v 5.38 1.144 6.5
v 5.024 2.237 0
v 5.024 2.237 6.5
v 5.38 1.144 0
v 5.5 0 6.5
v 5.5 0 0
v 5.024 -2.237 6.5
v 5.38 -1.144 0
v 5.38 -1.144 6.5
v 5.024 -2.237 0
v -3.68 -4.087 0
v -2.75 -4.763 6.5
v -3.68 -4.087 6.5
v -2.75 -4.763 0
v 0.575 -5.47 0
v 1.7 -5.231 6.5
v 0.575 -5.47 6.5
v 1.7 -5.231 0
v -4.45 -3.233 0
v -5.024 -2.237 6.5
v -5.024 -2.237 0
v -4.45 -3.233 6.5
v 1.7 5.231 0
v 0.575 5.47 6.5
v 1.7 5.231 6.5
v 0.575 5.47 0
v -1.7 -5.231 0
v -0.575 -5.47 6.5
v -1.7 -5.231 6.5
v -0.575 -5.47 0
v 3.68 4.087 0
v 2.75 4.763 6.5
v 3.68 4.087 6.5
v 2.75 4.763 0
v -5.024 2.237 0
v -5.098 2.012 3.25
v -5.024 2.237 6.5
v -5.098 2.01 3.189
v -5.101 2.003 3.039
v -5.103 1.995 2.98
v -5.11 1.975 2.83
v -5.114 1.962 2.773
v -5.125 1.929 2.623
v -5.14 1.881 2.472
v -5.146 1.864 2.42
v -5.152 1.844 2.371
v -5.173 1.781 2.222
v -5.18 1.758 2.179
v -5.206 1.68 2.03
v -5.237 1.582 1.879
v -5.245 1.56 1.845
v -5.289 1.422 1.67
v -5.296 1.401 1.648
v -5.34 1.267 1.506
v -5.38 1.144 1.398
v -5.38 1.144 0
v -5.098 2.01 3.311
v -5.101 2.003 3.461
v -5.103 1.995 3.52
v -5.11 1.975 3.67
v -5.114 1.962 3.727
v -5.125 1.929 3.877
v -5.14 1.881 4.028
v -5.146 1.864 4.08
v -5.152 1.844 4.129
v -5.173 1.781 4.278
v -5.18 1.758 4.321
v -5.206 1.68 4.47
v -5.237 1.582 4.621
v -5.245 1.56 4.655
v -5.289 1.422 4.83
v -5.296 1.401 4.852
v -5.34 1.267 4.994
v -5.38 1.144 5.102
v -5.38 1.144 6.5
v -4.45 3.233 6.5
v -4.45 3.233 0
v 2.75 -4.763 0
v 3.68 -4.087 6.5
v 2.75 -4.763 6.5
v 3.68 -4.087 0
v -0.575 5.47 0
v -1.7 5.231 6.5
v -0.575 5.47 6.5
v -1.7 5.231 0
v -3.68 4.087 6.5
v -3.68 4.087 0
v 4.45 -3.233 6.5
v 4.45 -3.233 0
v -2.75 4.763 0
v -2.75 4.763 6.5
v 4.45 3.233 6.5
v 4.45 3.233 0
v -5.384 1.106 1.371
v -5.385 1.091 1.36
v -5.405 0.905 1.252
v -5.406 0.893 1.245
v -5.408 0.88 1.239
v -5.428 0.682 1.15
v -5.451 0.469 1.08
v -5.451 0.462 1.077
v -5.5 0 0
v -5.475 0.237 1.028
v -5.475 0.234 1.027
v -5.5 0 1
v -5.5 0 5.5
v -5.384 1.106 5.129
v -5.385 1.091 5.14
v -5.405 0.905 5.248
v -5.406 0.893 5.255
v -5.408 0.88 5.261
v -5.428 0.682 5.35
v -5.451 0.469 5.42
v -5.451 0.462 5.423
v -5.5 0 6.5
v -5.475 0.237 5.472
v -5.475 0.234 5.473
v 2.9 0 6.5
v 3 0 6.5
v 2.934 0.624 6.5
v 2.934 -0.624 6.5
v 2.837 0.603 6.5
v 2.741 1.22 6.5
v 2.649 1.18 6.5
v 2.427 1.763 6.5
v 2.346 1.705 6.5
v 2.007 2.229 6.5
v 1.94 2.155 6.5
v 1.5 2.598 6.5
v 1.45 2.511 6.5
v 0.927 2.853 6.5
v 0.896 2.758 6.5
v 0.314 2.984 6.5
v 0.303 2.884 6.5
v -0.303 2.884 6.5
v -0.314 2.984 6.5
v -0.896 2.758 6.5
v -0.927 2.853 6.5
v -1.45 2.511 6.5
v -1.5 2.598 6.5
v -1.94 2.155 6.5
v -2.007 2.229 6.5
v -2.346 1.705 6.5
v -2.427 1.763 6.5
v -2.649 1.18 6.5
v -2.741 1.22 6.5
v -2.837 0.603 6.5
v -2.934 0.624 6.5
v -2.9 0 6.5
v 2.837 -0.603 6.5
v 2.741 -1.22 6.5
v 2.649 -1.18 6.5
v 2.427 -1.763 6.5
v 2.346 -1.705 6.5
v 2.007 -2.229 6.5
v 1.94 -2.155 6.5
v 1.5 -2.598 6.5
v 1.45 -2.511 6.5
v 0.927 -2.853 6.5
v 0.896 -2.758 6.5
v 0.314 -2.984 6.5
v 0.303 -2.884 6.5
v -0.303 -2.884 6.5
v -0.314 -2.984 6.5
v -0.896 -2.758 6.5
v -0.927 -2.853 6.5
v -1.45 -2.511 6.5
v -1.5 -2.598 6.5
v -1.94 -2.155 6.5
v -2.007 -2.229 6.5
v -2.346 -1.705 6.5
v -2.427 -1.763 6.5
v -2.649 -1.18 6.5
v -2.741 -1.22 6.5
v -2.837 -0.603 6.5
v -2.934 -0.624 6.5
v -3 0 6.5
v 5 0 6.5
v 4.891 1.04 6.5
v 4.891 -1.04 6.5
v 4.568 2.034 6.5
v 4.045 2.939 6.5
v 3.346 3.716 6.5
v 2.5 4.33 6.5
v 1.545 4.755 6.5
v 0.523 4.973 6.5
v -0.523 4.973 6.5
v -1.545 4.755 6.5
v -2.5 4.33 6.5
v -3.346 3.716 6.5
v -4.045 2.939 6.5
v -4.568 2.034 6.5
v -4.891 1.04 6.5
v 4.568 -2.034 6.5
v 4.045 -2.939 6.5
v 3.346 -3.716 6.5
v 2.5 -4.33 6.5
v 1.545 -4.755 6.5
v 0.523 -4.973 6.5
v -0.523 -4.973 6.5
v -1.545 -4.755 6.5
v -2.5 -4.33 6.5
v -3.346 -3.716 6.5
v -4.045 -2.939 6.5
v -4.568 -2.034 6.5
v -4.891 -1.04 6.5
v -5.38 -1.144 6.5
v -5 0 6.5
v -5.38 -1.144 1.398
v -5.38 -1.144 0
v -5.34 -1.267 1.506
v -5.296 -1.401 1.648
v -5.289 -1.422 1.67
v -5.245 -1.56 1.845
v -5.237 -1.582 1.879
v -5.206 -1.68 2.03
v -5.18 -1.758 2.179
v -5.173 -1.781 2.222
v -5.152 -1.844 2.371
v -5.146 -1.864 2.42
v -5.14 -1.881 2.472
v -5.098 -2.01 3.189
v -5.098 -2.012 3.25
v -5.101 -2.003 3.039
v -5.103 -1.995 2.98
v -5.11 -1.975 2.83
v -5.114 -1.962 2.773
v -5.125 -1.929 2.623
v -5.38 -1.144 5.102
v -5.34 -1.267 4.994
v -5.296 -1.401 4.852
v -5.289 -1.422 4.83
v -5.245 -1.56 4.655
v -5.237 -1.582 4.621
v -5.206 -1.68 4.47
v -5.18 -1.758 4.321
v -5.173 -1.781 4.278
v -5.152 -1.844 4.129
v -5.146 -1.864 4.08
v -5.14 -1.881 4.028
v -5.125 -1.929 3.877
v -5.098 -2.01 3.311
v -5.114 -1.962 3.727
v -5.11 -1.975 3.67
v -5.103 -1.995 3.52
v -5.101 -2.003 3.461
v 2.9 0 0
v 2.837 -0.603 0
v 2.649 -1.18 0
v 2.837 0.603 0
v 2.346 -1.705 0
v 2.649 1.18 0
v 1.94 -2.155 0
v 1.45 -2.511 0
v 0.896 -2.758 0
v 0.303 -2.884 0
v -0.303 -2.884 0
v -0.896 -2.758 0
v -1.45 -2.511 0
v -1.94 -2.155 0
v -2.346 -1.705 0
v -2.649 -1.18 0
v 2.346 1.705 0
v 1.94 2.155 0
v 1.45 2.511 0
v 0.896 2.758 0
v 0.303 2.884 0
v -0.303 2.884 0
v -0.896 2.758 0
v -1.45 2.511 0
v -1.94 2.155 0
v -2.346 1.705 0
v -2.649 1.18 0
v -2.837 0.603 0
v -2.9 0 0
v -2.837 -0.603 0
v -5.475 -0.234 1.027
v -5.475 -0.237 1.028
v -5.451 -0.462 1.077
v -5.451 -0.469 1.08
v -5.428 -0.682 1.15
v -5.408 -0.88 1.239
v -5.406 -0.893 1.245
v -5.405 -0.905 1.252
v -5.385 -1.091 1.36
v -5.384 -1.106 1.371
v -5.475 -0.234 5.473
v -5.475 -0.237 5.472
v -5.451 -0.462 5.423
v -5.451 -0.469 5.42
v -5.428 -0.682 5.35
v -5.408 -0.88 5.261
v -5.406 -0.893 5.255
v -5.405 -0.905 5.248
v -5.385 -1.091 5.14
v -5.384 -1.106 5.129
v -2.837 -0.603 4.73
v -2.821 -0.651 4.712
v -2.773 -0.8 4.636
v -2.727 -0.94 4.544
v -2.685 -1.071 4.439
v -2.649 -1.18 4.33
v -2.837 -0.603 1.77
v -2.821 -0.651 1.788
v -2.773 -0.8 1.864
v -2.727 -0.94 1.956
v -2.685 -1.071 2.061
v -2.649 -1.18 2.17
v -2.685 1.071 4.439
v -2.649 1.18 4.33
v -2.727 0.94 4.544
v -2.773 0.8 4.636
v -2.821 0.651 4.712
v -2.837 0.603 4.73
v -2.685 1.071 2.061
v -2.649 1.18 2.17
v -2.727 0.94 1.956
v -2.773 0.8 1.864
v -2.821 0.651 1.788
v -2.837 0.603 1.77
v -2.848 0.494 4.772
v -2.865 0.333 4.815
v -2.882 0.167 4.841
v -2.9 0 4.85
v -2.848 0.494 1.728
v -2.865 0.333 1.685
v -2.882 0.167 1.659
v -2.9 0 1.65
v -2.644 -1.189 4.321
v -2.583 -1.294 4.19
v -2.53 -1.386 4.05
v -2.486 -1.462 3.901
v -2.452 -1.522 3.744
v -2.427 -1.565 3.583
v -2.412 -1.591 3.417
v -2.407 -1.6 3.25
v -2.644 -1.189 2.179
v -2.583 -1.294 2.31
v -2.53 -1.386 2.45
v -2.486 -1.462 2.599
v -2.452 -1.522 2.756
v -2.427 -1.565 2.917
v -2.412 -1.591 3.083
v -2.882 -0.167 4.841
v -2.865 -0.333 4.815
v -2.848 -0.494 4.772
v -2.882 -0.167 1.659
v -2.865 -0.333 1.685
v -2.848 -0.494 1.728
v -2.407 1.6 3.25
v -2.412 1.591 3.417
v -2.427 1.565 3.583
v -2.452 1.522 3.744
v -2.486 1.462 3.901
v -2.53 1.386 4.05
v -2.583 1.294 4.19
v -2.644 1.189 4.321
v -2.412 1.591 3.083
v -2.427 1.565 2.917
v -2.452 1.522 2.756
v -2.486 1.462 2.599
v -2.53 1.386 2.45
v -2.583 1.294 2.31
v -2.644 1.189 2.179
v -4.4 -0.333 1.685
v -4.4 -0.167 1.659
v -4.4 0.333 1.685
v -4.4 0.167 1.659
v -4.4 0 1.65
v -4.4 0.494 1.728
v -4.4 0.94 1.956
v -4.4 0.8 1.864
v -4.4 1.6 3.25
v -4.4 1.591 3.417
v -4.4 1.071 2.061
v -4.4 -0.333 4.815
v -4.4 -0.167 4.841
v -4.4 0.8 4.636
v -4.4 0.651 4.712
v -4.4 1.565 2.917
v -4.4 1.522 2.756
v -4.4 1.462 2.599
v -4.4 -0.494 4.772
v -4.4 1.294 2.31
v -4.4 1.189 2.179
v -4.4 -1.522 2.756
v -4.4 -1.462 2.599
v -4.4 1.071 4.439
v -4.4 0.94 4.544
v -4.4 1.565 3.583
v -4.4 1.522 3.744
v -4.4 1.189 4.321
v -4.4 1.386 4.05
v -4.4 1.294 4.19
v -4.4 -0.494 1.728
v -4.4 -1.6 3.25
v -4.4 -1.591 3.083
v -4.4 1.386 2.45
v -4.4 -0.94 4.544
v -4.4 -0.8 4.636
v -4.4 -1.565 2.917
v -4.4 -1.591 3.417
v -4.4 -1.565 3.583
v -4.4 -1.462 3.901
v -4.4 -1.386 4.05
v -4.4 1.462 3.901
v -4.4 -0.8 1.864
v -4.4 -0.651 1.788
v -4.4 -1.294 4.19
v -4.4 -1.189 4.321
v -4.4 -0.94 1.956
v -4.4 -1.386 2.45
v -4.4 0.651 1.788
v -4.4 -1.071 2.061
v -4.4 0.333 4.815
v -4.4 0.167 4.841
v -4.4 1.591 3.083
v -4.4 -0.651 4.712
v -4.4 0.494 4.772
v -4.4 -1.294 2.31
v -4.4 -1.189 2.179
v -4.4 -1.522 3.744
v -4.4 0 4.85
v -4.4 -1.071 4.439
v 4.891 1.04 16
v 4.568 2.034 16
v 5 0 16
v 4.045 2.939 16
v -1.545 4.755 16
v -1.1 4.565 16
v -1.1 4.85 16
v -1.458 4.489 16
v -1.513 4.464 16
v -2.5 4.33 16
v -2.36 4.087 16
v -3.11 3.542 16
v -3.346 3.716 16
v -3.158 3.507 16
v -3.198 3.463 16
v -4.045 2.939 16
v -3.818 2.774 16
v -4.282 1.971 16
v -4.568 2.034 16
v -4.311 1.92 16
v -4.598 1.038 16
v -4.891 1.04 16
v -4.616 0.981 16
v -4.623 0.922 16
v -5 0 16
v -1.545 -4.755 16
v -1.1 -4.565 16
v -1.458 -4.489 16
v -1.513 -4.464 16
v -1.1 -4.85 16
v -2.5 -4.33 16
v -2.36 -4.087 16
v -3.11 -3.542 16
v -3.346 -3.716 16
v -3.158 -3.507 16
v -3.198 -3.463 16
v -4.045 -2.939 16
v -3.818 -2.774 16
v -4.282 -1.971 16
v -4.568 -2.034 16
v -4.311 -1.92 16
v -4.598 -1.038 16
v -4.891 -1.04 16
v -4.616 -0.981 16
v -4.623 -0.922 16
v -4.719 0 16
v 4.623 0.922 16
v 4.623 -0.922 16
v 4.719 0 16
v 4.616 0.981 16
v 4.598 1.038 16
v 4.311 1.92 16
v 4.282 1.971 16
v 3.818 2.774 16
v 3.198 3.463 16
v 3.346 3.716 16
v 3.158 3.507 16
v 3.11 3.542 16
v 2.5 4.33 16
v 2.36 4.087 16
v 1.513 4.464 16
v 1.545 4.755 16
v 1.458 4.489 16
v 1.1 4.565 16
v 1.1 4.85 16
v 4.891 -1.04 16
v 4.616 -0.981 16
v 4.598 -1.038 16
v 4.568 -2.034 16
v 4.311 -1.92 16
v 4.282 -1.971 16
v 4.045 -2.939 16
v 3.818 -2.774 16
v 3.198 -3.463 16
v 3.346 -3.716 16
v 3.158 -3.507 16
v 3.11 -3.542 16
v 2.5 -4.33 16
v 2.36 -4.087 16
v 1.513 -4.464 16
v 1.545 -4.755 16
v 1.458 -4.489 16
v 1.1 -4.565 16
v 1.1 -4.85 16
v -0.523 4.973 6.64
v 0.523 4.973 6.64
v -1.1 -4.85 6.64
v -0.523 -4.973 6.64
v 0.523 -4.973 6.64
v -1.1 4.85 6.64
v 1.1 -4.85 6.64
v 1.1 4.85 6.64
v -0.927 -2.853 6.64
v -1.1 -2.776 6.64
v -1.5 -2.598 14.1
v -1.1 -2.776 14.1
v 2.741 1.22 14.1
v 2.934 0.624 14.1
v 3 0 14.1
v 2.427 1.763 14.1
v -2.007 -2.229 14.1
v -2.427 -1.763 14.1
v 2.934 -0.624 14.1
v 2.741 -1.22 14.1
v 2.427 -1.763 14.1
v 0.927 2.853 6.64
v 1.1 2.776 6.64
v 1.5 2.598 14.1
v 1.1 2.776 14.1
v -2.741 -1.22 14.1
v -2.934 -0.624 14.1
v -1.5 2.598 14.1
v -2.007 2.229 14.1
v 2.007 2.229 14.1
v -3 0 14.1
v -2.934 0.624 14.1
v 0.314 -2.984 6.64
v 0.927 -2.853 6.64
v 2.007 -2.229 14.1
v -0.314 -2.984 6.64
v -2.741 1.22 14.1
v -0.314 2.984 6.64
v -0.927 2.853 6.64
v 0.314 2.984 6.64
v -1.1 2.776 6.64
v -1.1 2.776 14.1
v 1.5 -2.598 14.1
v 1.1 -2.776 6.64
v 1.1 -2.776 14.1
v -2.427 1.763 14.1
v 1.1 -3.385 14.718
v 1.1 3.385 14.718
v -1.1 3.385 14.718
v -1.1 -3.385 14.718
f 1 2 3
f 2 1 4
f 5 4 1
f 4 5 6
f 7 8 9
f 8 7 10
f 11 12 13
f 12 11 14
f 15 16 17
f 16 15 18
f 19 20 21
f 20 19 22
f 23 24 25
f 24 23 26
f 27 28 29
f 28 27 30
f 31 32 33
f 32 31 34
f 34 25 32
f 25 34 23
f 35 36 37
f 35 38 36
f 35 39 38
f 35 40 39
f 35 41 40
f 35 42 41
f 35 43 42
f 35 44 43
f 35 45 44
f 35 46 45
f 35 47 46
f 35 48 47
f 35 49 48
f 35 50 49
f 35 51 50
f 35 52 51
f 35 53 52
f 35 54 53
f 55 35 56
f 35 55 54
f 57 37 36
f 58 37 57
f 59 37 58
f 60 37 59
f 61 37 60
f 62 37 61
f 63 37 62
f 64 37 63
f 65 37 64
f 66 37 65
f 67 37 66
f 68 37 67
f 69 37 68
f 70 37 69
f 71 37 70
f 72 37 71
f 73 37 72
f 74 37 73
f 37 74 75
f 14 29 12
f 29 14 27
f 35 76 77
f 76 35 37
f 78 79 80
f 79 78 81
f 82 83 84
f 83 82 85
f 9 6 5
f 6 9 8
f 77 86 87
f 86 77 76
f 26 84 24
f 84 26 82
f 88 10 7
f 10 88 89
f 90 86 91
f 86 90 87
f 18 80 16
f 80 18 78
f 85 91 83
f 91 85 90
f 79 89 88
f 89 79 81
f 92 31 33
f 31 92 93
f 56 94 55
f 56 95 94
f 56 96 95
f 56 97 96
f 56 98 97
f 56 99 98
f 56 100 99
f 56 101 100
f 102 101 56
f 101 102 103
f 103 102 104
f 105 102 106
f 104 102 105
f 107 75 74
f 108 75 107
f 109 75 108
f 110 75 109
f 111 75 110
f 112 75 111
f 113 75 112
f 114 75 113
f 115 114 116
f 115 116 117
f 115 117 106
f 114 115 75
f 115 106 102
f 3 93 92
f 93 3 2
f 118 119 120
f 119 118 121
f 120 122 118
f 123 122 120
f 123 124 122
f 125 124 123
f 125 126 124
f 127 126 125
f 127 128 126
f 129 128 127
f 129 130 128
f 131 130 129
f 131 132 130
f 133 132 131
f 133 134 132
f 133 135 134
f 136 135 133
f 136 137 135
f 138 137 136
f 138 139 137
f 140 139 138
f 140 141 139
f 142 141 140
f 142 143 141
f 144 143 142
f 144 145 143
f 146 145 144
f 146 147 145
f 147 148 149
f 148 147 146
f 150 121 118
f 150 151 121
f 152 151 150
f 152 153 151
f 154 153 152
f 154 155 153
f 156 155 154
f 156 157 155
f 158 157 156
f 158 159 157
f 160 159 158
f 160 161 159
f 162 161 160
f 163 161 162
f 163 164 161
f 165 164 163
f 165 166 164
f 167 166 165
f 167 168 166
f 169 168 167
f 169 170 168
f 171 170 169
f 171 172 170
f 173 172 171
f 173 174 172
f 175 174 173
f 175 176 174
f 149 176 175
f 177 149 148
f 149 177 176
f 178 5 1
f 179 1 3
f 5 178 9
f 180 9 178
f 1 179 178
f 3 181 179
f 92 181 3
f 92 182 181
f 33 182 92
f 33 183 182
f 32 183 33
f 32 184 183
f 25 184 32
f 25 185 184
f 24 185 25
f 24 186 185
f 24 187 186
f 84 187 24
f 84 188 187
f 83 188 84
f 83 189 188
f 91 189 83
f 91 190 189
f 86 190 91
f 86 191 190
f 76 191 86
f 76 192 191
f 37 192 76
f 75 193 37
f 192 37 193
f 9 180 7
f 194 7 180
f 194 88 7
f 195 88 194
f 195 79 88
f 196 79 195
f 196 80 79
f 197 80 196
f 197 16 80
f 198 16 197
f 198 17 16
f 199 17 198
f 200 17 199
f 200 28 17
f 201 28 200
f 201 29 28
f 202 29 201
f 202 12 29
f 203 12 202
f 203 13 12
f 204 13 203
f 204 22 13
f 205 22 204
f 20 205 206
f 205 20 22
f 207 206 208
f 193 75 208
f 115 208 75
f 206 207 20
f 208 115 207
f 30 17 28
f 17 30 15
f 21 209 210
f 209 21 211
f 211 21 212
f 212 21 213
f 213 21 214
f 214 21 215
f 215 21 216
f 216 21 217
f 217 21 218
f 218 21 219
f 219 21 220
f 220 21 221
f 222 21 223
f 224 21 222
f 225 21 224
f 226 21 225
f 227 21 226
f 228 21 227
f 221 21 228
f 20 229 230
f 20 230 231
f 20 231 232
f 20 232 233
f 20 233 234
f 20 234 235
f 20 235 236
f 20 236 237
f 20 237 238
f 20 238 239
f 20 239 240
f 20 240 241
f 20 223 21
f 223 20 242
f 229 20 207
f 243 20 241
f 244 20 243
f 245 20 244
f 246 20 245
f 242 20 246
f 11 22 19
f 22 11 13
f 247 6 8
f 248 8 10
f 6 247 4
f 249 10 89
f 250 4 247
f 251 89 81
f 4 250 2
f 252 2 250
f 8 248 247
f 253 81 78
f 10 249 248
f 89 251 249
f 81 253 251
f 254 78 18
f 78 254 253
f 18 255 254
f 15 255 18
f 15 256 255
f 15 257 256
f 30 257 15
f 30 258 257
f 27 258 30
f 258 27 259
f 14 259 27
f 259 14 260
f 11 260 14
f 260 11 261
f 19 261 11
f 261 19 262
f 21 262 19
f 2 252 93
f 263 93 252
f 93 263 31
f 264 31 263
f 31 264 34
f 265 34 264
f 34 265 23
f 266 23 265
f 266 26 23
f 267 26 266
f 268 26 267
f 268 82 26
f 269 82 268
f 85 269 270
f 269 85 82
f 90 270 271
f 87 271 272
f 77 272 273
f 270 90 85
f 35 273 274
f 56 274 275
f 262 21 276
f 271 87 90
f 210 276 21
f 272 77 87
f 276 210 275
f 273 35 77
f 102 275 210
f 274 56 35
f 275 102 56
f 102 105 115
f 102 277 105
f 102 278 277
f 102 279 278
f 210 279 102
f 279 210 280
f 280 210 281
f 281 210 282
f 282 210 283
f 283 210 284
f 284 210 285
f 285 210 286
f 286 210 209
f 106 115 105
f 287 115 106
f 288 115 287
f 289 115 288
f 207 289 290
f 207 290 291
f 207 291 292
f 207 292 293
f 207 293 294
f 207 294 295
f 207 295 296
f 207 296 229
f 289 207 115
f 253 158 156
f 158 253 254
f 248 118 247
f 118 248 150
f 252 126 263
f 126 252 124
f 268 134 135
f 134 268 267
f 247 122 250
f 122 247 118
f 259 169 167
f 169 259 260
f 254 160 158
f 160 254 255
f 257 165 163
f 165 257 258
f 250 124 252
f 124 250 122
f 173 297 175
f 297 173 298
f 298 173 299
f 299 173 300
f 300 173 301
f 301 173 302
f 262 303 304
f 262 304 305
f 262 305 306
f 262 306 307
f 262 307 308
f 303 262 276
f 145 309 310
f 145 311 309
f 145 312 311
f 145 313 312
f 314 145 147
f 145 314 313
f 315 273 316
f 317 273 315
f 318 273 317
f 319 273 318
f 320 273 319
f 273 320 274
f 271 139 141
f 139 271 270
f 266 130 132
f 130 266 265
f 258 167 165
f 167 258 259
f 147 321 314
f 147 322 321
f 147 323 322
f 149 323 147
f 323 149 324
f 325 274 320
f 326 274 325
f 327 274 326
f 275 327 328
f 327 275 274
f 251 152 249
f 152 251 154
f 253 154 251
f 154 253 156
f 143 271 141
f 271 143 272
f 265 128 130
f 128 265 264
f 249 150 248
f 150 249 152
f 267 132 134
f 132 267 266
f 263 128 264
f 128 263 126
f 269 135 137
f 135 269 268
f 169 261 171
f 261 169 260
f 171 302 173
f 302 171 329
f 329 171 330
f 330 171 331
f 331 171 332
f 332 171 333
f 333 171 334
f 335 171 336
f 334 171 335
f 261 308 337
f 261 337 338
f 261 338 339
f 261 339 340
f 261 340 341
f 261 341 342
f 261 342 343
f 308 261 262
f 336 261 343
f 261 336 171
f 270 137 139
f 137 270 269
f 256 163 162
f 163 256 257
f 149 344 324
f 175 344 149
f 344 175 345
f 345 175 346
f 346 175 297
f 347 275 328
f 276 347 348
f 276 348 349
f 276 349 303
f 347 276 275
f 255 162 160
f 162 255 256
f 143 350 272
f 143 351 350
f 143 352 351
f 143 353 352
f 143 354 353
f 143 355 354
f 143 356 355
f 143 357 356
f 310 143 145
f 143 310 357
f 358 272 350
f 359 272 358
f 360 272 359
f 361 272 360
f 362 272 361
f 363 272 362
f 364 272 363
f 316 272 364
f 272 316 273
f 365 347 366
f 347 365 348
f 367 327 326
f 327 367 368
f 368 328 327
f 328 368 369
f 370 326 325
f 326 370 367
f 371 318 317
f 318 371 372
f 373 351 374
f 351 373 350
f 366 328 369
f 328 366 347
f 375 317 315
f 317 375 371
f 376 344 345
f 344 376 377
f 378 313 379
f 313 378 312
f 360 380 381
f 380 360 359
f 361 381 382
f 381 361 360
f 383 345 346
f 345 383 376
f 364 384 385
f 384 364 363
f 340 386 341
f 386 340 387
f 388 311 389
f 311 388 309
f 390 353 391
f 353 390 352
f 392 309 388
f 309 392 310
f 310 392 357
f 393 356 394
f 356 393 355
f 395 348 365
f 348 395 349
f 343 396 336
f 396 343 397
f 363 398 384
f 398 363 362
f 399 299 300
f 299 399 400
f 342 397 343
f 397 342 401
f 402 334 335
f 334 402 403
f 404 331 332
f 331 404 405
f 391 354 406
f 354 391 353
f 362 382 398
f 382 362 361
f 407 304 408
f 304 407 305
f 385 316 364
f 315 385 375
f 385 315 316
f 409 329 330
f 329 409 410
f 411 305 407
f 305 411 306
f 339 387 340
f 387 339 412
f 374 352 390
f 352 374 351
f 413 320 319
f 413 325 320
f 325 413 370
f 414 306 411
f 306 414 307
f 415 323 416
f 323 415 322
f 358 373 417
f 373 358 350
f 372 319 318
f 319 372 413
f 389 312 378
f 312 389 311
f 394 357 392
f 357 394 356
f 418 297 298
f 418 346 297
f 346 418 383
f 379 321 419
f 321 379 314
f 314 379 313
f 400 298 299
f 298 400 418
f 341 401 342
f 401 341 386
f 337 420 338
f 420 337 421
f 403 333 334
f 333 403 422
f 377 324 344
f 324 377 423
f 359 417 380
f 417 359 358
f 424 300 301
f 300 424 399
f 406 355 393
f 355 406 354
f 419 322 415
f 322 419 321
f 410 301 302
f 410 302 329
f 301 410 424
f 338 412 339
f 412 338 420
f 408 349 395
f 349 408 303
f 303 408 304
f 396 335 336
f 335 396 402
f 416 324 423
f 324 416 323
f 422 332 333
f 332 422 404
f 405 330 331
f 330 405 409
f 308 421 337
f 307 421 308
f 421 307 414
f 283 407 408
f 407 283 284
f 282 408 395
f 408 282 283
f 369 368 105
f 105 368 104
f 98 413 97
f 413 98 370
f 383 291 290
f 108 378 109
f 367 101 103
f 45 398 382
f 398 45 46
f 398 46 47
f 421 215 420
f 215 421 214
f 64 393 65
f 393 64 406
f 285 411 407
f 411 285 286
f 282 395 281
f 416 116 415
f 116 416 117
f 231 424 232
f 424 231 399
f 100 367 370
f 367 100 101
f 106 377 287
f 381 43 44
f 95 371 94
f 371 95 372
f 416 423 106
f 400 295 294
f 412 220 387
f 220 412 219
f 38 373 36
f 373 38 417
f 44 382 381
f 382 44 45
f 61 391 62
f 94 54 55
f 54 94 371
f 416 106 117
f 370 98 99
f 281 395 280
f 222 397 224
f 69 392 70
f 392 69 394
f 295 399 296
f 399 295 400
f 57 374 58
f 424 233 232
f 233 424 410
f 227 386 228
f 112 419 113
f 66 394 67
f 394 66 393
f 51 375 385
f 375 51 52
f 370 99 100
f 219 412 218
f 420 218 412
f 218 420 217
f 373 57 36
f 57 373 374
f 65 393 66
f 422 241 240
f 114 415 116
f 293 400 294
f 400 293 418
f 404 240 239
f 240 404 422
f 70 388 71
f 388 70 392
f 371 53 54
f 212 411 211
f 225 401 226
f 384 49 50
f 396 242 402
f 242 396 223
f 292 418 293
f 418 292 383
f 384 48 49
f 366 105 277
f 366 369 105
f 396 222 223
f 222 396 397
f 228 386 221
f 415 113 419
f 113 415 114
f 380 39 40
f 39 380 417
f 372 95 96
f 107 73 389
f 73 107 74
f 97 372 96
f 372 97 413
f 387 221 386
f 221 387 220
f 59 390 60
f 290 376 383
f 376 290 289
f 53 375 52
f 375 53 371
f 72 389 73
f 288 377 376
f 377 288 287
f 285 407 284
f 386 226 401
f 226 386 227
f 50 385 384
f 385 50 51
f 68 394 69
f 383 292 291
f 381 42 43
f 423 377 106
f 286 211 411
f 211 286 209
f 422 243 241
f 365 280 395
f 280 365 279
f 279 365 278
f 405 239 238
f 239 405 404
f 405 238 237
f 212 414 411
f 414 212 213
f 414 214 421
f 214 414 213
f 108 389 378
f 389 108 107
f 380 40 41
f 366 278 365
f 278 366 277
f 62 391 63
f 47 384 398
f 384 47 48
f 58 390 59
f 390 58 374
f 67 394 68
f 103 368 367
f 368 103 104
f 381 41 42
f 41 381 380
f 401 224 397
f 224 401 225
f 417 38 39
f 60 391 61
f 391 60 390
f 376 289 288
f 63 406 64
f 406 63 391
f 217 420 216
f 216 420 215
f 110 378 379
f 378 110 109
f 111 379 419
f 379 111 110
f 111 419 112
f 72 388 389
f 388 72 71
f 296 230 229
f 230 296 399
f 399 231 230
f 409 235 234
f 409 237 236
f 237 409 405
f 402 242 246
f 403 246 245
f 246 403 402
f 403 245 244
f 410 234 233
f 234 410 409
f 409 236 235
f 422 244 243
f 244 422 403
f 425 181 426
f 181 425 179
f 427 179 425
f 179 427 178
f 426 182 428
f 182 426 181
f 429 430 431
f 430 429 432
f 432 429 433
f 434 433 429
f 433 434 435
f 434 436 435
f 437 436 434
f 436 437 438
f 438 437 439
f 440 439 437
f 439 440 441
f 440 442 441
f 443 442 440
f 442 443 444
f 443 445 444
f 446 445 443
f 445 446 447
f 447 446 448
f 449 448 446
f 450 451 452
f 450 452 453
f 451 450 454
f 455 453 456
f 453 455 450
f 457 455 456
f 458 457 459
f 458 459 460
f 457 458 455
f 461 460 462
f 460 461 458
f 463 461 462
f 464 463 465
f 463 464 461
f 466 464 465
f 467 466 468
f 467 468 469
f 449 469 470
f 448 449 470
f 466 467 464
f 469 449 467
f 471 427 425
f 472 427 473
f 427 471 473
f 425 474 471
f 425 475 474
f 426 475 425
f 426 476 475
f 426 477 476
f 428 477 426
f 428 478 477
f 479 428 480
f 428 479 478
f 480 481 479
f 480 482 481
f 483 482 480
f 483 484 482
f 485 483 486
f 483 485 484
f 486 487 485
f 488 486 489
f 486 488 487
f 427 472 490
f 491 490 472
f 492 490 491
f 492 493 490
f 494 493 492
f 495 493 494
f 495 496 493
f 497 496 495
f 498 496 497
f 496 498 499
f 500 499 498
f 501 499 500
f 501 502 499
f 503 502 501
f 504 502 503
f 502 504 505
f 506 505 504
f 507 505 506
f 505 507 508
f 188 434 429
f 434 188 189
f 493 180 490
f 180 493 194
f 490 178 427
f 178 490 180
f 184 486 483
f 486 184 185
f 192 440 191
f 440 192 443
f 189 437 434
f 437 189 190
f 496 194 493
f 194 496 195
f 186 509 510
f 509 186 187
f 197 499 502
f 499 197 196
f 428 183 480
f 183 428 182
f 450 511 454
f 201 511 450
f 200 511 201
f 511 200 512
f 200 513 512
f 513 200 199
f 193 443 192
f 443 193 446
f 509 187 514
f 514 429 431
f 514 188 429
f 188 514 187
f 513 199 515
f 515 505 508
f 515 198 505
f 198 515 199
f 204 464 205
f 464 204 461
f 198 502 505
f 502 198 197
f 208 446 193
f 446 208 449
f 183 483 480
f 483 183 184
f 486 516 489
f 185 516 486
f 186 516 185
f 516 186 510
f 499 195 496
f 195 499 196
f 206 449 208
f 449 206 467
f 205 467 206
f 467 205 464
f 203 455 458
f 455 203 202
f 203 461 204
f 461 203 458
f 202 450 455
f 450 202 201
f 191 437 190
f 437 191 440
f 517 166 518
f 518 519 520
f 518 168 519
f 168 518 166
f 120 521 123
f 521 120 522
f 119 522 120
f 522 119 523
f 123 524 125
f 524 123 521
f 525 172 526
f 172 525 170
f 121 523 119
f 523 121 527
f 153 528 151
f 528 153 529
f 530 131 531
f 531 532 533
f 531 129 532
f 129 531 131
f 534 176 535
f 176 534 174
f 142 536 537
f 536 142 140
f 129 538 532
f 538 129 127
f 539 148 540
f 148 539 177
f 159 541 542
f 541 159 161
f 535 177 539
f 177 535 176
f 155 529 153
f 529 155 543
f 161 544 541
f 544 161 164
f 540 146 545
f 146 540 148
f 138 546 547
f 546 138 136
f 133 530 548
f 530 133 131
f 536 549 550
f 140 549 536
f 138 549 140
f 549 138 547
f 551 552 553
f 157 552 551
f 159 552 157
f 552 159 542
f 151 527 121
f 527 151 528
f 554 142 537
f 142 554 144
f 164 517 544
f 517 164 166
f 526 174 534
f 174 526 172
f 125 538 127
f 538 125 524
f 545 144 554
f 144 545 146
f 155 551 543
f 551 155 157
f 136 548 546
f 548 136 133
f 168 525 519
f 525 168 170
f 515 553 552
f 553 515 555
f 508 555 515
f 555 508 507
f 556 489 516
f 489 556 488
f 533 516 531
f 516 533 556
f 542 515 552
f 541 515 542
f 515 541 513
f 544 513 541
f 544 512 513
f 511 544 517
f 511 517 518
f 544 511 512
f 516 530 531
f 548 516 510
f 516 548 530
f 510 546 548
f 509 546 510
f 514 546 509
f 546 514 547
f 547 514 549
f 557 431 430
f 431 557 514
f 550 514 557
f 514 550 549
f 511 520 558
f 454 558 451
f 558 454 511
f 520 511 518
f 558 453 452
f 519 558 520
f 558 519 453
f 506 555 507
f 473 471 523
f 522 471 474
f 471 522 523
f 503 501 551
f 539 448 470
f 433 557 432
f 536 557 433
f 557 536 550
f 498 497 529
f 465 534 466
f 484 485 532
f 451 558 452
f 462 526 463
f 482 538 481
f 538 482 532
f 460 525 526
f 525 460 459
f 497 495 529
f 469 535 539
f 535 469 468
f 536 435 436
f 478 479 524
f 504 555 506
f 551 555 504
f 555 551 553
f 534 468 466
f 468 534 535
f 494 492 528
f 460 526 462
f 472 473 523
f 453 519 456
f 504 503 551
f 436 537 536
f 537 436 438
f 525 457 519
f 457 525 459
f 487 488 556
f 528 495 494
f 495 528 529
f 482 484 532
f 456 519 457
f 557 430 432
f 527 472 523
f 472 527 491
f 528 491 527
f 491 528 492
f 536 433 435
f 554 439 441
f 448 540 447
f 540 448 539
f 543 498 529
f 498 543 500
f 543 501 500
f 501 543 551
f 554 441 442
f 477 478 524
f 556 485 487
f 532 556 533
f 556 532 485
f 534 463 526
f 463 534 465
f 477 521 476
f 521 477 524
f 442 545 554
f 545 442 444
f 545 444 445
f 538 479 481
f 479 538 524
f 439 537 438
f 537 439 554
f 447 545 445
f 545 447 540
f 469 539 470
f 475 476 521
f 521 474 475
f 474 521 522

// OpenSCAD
/**
  * Module: Drive Cup.
  * A drive cup is a mechanical part used to connect the driveshaft or universal
  * joints to the differential or wheel axles.
  *
  * Current supported type is dogbone drive cup that holds the ball of a dogbone
  * drive shaft to transfer power to the wheels.
  *
  *
  * Author: Karim Aziiev <karim.aziiev@gmail.com>
  * License: GPL-3.0-or-later
  */

include <../colors.scad>
include <../parameters.scad>

use <../lib/functions.scad>
use <../lib/plist.scad>
use <../lib/shapes3d.scad>
use <../lib/slots.scad>
use <../lib/transforms.scad>

drive_cup_base_plist = ["od", 11,
                        "h", 6.5,
                        "d", 5.8,
                        "bolt_d", m3_hole_dia,
                        "bolt_n", 1,
                        "bore_d", 4.5,
                        "bore_h", 1,
                        "sink", true,
                        "bolt_distance", "50%", // either "number", either numeric string-percent, e.g. "90%" from `h`,
                        ];

dogbone_cup_plist    = ["od", 10,
                        "d", plist_get("d", drive_cup_base_plist),
                        "wall", 2,
                        "h", 9.5,
                        "cutout_h", "98%", // either "number", either numeric string-percent, e.g. "90%" from `h`
                        "cutout_w", 2.2,
                        "upper_hole_d", "99%",
                        "upper_hole_h", 2];

drive_cup_plist      = ["dogbone_cup", dogbone_cup_plist,
                        "base_cup", drive_cup_base_plist,
                        "color", metallic_silver_3];

module drive_cup_base(plist, color) {
  od = plist_get("od", plist);
  h = plist_get("h", plist);
  d = plist_get("d", plist);

  thickness = plist_get("bolt_depth", plist, d ? (od - d) : od);

  bolt_d = plist_get("bolt_d", plist);
  bore_d = plist_get("bore_d", plist);
  sink = plist_get("sink", plist);
  bore_h = plist_get("bore_h", plist);
  bolt_n = plist_get("bolt_n", plist, bolt_d ? 1 : 0);
  bolt_distance = plist_maybe_from_percent(prop="bolt_distance",
                                           plist=plist,
                                           default="50%",
                                           total=h);

  module _bolt_hole() {
    translate([-od / 2 + 0.1, 0, bolt_distance]) {
      rotate([0, 90, 0]) {
        counterbore(h=thickness,
                    d=bolt_d,
                    bore_h=bore_h,
                    bore_d=bore_d,
                    sink=sink,
                    reverse=true);
      }
    }
  }

  render() {
    difference() {
      ring(od=od, d=d, h=h, color=color);

      if (bolt_d && bolt_n > 0) {
        for (i = [0 : bolt_n - 1]) {

          let (angle = i * 360 / bolt_n) {
            rotate([0, 0, angle]) {
              _bolt_hole();
            }
          }
        }
      }
    }
  }
}

module drive_cup_dogbone_cup(plist, color) {

  od = plist_get("od", plist);
  wall = plist_get("wall", plist);
  hole_d = od - wall * 2;
  h = plist_get("h", plist);
  cutout_w = plist_get("cutout_w", plist);
  cutout_h = plist_maybe_from_percent(prop="cutout_h",
                                      plist=plist,
                                      default="99%",
                                      total=h);

  upper_hole_h = plist_maybe_from_percent(prop="upper_hole_h",
                                          plist=plist,
                                          total=h);
  upper_hole_d = plist_maybe_from_percent(prop="upper_hole_d",
                                          plist=plist,
                                          total=od - 0.1);

  difference() {
    ring(od=od, d=hole_d, h=h, color=color);
    if (cutout_w && cutout_h) {
      translate([0, 0, cutout_h / 2 + h - cutout_h]) {
        cube([cutout_w, od, cutout_h + 0.1], center=true);
      }
    }
    if (upper_hole_h && upper_hole_d) {
      translate([0, 0, h - upper_hole_h + 0.1]) {
        cylinder(d2=upper_hole_d, d1=hole_d, h=upper_hole_h + 0.1, $fn=30);
      }
    }
  }
}

module drive_cup(plist) {
  dogbone_cup = plist_get("dogbone_cup", plist);
  base_cup = plist_get("base_cup", plist);
  color = plist_get("color", plist);
  base_cup_h = base_cup ? plist_get("h", base_cup) : undef;
  union() {
    if (base_cup) {
      drive_cup_base(plist=base_cup, color=color);
    }

    if (dogbone_cup) {
      maybe_translate([0, 0, base_cup_h]) {
        drive_cup_dogbone_cup(plist=dogbone_cup, color=color);
      }
    }
  }
}

drive_cup(plist=drive_cup_plist);
